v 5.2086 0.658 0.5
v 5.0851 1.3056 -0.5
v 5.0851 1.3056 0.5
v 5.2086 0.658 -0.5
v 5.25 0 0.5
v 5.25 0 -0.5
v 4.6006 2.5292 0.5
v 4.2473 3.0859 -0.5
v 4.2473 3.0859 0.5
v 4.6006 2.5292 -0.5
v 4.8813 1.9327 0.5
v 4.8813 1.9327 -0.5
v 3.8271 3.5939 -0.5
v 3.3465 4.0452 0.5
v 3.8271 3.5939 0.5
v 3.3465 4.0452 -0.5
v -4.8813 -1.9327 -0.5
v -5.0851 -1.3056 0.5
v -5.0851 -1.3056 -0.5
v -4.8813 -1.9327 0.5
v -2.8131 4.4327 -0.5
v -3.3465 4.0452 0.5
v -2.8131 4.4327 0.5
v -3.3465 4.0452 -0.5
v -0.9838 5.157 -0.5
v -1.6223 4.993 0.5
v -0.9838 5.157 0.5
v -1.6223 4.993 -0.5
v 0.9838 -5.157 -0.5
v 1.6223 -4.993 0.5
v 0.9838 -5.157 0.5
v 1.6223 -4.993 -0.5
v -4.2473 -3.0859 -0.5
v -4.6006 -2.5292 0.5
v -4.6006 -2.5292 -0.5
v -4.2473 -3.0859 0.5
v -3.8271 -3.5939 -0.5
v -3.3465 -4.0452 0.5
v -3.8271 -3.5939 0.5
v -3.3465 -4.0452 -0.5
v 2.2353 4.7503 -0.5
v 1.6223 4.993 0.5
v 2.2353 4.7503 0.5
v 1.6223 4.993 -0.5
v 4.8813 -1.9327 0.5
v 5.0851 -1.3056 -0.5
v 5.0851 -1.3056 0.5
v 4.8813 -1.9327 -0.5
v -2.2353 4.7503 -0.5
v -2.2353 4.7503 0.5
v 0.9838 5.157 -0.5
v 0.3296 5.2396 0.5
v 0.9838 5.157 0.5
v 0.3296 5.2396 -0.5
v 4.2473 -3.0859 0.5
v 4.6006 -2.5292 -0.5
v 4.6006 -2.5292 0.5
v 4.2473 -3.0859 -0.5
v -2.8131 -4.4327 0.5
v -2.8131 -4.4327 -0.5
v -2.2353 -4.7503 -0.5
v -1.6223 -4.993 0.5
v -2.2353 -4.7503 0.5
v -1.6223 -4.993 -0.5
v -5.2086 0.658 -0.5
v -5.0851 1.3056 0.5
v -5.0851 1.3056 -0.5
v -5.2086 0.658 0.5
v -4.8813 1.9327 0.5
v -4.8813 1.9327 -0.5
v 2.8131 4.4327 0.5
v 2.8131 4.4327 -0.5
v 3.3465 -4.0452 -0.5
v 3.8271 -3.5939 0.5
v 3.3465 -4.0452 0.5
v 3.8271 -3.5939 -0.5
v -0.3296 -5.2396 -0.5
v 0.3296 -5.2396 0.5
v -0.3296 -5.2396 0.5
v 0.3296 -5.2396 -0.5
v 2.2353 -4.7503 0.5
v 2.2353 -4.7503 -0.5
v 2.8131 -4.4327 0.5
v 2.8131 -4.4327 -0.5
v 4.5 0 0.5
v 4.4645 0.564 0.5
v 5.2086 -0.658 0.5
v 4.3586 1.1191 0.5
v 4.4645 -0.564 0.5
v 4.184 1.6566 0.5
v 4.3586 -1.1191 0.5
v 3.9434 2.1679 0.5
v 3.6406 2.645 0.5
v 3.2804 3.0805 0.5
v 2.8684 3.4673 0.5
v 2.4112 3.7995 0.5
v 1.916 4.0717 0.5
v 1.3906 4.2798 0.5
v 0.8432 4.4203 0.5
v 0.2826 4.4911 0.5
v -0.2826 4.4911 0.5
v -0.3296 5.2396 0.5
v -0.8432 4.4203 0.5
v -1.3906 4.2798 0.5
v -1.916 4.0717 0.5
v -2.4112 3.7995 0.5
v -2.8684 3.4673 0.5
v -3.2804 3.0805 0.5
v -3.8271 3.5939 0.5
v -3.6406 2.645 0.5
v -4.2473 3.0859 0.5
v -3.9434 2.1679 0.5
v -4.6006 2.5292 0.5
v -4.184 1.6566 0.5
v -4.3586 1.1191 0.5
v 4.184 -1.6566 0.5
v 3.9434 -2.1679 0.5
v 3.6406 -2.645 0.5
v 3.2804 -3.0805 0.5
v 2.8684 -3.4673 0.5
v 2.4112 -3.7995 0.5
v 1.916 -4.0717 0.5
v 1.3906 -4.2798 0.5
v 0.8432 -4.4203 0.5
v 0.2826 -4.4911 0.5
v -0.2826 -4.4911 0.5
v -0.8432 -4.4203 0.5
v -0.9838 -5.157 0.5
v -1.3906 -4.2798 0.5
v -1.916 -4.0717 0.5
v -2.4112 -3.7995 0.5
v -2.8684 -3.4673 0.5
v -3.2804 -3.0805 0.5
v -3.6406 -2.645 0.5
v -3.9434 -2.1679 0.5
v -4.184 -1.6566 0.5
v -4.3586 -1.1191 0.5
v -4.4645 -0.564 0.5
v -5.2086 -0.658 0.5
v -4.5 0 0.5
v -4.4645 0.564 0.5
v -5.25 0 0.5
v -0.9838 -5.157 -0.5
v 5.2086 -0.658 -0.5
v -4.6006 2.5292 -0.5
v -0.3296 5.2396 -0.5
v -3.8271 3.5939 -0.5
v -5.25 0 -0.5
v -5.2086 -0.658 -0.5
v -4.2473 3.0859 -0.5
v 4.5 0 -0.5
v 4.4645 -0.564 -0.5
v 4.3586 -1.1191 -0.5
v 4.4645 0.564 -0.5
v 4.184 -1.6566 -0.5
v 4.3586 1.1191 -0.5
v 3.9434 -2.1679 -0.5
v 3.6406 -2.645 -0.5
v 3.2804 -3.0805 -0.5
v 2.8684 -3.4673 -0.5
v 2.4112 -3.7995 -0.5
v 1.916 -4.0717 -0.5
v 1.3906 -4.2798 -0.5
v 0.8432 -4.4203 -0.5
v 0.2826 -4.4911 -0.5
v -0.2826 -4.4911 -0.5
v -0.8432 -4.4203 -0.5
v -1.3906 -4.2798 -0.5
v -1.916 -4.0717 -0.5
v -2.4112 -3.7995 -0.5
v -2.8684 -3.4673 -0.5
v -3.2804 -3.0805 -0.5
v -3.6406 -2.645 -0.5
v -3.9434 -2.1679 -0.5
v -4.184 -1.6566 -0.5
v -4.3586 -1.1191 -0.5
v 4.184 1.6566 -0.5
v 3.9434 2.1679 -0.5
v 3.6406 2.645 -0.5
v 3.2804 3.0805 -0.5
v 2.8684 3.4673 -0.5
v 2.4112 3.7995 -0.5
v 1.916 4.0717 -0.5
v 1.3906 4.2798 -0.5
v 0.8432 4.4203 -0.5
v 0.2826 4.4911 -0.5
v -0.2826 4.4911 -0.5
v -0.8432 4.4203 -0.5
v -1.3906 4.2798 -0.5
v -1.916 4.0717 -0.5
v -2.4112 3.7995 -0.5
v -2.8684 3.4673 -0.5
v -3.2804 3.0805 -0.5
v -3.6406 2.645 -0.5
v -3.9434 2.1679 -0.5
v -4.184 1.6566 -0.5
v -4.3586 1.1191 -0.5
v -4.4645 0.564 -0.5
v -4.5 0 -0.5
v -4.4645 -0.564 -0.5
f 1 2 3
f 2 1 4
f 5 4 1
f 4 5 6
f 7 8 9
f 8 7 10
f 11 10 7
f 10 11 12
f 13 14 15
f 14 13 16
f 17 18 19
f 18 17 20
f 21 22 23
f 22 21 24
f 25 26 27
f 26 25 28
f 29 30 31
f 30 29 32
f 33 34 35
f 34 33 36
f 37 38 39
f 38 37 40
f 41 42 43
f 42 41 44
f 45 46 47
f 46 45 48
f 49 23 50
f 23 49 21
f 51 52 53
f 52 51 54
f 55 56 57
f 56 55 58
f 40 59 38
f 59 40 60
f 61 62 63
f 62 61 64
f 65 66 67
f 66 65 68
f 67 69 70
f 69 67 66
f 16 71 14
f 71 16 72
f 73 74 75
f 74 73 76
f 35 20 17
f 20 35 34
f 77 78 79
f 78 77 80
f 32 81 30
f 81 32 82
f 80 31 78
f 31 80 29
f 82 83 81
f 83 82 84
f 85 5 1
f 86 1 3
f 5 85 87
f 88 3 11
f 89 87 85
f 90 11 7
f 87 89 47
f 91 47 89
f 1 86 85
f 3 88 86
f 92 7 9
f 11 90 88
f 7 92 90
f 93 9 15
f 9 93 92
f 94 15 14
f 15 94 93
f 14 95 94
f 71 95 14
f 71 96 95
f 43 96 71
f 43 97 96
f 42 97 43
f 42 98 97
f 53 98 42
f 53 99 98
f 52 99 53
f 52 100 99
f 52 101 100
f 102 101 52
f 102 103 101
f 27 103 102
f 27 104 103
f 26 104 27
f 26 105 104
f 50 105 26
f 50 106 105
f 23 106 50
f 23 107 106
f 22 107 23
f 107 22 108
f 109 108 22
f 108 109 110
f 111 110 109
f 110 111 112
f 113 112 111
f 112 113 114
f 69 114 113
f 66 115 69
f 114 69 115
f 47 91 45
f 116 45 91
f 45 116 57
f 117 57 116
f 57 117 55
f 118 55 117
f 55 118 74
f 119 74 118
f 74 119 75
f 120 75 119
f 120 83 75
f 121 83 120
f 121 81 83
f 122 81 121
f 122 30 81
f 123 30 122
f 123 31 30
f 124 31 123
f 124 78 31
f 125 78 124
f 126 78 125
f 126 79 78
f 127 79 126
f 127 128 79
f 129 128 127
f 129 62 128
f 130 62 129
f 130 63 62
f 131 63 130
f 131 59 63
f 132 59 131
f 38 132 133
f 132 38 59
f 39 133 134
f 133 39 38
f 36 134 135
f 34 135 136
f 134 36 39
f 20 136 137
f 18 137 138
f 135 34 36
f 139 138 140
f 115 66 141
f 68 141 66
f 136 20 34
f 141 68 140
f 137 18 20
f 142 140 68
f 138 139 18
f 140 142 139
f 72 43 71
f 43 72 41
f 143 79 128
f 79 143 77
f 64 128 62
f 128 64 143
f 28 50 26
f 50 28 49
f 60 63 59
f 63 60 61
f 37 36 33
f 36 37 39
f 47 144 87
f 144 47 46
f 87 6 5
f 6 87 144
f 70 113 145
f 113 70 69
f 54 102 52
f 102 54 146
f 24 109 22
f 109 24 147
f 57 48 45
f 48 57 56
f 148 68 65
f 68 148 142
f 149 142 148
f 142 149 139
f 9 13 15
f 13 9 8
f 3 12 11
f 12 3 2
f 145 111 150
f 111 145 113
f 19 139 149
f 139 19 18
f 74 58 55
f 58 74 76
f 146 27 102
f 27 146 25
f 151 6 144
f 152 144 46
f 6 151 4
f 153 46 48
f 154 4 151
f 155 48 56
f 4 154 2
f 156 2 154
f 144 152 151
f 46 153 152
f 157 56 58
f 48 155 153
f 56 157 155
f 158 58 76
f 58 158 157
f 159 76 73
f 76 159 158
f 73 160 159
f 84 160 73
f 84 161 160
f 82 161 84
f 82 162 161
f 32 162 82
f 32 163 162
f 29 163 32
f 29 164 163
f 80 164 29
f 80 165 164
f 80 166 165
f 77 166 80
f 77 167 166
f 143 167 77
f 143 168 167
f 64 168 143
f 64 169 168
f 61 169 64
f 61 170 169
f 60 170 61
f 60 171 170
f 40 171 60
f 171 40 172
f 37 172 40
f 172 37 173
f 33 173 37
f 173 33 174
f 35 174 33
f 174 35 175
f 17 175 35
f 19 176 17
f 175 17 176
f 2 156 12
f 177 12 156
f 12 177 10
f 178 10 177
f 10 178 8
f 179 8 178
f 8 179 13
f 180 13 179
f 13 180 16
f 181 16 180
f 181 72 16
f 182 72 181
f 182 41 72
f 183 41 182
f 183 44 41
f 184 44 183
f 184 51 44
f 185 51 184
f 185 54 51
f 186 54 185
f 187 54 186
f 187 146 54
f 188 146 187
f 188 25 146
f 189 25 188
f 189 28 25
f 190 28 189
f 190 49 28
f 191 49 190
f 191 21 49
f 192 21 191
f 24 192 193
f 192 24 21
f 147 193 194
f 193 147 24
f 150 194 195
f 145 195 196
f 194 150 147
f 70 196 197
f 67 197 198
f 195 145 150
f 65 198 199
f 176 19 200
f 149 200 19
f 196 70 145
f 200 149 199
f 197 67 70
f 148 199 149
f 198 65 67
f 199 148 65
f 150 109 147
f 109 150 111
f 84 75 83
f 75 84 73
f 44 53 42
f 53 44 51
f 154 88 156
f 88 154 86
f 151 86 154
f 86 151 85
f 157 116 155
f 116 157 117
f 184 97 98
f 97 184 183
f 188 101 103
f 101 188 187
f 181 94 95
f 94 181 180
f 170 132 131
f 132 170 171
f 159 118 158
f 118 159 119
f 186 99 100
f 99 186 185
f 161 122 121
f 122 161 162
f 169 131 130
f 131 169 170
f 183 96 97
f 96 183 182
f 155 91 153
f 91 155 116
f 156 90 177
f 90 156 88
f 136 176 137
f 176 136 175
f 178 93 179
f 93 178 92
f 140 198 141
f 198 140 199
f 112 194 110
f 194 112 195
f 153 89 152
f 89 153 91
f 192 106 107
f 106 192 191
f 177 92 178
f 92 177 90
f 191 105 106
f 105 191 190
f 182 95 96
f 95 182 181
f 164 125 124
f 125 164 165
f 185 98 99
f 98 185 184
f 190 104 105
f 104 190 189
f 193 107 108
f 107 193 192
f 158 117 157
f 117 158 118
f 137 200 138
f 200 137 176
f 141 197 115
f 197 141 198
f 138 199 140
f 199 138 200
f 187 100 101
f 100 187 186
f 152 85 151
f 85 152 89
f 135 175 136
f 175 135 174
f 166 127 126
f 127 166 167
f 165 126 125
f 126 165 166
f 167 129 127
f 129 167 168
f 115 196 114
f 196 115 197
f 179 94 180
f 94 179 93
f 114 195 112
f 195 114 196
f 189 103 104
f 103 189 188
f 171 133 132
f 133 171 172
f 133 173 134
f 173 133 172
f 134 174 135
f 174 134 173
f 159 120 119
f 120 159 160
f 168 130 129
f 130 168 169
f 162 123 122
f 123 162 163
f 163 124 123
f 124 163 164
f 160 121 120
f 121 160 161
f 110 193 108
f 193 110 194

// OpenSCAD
$fn = 50;


difference() {
	union() {
		translate(v = [0, 0, -0.5000000000]) {
			cylinder(h = 1, r = 5.2500000000);
		}
	}
	union() {
		translate(v = [0, 0, -100.0000000000]) {
			cylinder(h = 200, r = 4.5000000000);
		}
	}
}
